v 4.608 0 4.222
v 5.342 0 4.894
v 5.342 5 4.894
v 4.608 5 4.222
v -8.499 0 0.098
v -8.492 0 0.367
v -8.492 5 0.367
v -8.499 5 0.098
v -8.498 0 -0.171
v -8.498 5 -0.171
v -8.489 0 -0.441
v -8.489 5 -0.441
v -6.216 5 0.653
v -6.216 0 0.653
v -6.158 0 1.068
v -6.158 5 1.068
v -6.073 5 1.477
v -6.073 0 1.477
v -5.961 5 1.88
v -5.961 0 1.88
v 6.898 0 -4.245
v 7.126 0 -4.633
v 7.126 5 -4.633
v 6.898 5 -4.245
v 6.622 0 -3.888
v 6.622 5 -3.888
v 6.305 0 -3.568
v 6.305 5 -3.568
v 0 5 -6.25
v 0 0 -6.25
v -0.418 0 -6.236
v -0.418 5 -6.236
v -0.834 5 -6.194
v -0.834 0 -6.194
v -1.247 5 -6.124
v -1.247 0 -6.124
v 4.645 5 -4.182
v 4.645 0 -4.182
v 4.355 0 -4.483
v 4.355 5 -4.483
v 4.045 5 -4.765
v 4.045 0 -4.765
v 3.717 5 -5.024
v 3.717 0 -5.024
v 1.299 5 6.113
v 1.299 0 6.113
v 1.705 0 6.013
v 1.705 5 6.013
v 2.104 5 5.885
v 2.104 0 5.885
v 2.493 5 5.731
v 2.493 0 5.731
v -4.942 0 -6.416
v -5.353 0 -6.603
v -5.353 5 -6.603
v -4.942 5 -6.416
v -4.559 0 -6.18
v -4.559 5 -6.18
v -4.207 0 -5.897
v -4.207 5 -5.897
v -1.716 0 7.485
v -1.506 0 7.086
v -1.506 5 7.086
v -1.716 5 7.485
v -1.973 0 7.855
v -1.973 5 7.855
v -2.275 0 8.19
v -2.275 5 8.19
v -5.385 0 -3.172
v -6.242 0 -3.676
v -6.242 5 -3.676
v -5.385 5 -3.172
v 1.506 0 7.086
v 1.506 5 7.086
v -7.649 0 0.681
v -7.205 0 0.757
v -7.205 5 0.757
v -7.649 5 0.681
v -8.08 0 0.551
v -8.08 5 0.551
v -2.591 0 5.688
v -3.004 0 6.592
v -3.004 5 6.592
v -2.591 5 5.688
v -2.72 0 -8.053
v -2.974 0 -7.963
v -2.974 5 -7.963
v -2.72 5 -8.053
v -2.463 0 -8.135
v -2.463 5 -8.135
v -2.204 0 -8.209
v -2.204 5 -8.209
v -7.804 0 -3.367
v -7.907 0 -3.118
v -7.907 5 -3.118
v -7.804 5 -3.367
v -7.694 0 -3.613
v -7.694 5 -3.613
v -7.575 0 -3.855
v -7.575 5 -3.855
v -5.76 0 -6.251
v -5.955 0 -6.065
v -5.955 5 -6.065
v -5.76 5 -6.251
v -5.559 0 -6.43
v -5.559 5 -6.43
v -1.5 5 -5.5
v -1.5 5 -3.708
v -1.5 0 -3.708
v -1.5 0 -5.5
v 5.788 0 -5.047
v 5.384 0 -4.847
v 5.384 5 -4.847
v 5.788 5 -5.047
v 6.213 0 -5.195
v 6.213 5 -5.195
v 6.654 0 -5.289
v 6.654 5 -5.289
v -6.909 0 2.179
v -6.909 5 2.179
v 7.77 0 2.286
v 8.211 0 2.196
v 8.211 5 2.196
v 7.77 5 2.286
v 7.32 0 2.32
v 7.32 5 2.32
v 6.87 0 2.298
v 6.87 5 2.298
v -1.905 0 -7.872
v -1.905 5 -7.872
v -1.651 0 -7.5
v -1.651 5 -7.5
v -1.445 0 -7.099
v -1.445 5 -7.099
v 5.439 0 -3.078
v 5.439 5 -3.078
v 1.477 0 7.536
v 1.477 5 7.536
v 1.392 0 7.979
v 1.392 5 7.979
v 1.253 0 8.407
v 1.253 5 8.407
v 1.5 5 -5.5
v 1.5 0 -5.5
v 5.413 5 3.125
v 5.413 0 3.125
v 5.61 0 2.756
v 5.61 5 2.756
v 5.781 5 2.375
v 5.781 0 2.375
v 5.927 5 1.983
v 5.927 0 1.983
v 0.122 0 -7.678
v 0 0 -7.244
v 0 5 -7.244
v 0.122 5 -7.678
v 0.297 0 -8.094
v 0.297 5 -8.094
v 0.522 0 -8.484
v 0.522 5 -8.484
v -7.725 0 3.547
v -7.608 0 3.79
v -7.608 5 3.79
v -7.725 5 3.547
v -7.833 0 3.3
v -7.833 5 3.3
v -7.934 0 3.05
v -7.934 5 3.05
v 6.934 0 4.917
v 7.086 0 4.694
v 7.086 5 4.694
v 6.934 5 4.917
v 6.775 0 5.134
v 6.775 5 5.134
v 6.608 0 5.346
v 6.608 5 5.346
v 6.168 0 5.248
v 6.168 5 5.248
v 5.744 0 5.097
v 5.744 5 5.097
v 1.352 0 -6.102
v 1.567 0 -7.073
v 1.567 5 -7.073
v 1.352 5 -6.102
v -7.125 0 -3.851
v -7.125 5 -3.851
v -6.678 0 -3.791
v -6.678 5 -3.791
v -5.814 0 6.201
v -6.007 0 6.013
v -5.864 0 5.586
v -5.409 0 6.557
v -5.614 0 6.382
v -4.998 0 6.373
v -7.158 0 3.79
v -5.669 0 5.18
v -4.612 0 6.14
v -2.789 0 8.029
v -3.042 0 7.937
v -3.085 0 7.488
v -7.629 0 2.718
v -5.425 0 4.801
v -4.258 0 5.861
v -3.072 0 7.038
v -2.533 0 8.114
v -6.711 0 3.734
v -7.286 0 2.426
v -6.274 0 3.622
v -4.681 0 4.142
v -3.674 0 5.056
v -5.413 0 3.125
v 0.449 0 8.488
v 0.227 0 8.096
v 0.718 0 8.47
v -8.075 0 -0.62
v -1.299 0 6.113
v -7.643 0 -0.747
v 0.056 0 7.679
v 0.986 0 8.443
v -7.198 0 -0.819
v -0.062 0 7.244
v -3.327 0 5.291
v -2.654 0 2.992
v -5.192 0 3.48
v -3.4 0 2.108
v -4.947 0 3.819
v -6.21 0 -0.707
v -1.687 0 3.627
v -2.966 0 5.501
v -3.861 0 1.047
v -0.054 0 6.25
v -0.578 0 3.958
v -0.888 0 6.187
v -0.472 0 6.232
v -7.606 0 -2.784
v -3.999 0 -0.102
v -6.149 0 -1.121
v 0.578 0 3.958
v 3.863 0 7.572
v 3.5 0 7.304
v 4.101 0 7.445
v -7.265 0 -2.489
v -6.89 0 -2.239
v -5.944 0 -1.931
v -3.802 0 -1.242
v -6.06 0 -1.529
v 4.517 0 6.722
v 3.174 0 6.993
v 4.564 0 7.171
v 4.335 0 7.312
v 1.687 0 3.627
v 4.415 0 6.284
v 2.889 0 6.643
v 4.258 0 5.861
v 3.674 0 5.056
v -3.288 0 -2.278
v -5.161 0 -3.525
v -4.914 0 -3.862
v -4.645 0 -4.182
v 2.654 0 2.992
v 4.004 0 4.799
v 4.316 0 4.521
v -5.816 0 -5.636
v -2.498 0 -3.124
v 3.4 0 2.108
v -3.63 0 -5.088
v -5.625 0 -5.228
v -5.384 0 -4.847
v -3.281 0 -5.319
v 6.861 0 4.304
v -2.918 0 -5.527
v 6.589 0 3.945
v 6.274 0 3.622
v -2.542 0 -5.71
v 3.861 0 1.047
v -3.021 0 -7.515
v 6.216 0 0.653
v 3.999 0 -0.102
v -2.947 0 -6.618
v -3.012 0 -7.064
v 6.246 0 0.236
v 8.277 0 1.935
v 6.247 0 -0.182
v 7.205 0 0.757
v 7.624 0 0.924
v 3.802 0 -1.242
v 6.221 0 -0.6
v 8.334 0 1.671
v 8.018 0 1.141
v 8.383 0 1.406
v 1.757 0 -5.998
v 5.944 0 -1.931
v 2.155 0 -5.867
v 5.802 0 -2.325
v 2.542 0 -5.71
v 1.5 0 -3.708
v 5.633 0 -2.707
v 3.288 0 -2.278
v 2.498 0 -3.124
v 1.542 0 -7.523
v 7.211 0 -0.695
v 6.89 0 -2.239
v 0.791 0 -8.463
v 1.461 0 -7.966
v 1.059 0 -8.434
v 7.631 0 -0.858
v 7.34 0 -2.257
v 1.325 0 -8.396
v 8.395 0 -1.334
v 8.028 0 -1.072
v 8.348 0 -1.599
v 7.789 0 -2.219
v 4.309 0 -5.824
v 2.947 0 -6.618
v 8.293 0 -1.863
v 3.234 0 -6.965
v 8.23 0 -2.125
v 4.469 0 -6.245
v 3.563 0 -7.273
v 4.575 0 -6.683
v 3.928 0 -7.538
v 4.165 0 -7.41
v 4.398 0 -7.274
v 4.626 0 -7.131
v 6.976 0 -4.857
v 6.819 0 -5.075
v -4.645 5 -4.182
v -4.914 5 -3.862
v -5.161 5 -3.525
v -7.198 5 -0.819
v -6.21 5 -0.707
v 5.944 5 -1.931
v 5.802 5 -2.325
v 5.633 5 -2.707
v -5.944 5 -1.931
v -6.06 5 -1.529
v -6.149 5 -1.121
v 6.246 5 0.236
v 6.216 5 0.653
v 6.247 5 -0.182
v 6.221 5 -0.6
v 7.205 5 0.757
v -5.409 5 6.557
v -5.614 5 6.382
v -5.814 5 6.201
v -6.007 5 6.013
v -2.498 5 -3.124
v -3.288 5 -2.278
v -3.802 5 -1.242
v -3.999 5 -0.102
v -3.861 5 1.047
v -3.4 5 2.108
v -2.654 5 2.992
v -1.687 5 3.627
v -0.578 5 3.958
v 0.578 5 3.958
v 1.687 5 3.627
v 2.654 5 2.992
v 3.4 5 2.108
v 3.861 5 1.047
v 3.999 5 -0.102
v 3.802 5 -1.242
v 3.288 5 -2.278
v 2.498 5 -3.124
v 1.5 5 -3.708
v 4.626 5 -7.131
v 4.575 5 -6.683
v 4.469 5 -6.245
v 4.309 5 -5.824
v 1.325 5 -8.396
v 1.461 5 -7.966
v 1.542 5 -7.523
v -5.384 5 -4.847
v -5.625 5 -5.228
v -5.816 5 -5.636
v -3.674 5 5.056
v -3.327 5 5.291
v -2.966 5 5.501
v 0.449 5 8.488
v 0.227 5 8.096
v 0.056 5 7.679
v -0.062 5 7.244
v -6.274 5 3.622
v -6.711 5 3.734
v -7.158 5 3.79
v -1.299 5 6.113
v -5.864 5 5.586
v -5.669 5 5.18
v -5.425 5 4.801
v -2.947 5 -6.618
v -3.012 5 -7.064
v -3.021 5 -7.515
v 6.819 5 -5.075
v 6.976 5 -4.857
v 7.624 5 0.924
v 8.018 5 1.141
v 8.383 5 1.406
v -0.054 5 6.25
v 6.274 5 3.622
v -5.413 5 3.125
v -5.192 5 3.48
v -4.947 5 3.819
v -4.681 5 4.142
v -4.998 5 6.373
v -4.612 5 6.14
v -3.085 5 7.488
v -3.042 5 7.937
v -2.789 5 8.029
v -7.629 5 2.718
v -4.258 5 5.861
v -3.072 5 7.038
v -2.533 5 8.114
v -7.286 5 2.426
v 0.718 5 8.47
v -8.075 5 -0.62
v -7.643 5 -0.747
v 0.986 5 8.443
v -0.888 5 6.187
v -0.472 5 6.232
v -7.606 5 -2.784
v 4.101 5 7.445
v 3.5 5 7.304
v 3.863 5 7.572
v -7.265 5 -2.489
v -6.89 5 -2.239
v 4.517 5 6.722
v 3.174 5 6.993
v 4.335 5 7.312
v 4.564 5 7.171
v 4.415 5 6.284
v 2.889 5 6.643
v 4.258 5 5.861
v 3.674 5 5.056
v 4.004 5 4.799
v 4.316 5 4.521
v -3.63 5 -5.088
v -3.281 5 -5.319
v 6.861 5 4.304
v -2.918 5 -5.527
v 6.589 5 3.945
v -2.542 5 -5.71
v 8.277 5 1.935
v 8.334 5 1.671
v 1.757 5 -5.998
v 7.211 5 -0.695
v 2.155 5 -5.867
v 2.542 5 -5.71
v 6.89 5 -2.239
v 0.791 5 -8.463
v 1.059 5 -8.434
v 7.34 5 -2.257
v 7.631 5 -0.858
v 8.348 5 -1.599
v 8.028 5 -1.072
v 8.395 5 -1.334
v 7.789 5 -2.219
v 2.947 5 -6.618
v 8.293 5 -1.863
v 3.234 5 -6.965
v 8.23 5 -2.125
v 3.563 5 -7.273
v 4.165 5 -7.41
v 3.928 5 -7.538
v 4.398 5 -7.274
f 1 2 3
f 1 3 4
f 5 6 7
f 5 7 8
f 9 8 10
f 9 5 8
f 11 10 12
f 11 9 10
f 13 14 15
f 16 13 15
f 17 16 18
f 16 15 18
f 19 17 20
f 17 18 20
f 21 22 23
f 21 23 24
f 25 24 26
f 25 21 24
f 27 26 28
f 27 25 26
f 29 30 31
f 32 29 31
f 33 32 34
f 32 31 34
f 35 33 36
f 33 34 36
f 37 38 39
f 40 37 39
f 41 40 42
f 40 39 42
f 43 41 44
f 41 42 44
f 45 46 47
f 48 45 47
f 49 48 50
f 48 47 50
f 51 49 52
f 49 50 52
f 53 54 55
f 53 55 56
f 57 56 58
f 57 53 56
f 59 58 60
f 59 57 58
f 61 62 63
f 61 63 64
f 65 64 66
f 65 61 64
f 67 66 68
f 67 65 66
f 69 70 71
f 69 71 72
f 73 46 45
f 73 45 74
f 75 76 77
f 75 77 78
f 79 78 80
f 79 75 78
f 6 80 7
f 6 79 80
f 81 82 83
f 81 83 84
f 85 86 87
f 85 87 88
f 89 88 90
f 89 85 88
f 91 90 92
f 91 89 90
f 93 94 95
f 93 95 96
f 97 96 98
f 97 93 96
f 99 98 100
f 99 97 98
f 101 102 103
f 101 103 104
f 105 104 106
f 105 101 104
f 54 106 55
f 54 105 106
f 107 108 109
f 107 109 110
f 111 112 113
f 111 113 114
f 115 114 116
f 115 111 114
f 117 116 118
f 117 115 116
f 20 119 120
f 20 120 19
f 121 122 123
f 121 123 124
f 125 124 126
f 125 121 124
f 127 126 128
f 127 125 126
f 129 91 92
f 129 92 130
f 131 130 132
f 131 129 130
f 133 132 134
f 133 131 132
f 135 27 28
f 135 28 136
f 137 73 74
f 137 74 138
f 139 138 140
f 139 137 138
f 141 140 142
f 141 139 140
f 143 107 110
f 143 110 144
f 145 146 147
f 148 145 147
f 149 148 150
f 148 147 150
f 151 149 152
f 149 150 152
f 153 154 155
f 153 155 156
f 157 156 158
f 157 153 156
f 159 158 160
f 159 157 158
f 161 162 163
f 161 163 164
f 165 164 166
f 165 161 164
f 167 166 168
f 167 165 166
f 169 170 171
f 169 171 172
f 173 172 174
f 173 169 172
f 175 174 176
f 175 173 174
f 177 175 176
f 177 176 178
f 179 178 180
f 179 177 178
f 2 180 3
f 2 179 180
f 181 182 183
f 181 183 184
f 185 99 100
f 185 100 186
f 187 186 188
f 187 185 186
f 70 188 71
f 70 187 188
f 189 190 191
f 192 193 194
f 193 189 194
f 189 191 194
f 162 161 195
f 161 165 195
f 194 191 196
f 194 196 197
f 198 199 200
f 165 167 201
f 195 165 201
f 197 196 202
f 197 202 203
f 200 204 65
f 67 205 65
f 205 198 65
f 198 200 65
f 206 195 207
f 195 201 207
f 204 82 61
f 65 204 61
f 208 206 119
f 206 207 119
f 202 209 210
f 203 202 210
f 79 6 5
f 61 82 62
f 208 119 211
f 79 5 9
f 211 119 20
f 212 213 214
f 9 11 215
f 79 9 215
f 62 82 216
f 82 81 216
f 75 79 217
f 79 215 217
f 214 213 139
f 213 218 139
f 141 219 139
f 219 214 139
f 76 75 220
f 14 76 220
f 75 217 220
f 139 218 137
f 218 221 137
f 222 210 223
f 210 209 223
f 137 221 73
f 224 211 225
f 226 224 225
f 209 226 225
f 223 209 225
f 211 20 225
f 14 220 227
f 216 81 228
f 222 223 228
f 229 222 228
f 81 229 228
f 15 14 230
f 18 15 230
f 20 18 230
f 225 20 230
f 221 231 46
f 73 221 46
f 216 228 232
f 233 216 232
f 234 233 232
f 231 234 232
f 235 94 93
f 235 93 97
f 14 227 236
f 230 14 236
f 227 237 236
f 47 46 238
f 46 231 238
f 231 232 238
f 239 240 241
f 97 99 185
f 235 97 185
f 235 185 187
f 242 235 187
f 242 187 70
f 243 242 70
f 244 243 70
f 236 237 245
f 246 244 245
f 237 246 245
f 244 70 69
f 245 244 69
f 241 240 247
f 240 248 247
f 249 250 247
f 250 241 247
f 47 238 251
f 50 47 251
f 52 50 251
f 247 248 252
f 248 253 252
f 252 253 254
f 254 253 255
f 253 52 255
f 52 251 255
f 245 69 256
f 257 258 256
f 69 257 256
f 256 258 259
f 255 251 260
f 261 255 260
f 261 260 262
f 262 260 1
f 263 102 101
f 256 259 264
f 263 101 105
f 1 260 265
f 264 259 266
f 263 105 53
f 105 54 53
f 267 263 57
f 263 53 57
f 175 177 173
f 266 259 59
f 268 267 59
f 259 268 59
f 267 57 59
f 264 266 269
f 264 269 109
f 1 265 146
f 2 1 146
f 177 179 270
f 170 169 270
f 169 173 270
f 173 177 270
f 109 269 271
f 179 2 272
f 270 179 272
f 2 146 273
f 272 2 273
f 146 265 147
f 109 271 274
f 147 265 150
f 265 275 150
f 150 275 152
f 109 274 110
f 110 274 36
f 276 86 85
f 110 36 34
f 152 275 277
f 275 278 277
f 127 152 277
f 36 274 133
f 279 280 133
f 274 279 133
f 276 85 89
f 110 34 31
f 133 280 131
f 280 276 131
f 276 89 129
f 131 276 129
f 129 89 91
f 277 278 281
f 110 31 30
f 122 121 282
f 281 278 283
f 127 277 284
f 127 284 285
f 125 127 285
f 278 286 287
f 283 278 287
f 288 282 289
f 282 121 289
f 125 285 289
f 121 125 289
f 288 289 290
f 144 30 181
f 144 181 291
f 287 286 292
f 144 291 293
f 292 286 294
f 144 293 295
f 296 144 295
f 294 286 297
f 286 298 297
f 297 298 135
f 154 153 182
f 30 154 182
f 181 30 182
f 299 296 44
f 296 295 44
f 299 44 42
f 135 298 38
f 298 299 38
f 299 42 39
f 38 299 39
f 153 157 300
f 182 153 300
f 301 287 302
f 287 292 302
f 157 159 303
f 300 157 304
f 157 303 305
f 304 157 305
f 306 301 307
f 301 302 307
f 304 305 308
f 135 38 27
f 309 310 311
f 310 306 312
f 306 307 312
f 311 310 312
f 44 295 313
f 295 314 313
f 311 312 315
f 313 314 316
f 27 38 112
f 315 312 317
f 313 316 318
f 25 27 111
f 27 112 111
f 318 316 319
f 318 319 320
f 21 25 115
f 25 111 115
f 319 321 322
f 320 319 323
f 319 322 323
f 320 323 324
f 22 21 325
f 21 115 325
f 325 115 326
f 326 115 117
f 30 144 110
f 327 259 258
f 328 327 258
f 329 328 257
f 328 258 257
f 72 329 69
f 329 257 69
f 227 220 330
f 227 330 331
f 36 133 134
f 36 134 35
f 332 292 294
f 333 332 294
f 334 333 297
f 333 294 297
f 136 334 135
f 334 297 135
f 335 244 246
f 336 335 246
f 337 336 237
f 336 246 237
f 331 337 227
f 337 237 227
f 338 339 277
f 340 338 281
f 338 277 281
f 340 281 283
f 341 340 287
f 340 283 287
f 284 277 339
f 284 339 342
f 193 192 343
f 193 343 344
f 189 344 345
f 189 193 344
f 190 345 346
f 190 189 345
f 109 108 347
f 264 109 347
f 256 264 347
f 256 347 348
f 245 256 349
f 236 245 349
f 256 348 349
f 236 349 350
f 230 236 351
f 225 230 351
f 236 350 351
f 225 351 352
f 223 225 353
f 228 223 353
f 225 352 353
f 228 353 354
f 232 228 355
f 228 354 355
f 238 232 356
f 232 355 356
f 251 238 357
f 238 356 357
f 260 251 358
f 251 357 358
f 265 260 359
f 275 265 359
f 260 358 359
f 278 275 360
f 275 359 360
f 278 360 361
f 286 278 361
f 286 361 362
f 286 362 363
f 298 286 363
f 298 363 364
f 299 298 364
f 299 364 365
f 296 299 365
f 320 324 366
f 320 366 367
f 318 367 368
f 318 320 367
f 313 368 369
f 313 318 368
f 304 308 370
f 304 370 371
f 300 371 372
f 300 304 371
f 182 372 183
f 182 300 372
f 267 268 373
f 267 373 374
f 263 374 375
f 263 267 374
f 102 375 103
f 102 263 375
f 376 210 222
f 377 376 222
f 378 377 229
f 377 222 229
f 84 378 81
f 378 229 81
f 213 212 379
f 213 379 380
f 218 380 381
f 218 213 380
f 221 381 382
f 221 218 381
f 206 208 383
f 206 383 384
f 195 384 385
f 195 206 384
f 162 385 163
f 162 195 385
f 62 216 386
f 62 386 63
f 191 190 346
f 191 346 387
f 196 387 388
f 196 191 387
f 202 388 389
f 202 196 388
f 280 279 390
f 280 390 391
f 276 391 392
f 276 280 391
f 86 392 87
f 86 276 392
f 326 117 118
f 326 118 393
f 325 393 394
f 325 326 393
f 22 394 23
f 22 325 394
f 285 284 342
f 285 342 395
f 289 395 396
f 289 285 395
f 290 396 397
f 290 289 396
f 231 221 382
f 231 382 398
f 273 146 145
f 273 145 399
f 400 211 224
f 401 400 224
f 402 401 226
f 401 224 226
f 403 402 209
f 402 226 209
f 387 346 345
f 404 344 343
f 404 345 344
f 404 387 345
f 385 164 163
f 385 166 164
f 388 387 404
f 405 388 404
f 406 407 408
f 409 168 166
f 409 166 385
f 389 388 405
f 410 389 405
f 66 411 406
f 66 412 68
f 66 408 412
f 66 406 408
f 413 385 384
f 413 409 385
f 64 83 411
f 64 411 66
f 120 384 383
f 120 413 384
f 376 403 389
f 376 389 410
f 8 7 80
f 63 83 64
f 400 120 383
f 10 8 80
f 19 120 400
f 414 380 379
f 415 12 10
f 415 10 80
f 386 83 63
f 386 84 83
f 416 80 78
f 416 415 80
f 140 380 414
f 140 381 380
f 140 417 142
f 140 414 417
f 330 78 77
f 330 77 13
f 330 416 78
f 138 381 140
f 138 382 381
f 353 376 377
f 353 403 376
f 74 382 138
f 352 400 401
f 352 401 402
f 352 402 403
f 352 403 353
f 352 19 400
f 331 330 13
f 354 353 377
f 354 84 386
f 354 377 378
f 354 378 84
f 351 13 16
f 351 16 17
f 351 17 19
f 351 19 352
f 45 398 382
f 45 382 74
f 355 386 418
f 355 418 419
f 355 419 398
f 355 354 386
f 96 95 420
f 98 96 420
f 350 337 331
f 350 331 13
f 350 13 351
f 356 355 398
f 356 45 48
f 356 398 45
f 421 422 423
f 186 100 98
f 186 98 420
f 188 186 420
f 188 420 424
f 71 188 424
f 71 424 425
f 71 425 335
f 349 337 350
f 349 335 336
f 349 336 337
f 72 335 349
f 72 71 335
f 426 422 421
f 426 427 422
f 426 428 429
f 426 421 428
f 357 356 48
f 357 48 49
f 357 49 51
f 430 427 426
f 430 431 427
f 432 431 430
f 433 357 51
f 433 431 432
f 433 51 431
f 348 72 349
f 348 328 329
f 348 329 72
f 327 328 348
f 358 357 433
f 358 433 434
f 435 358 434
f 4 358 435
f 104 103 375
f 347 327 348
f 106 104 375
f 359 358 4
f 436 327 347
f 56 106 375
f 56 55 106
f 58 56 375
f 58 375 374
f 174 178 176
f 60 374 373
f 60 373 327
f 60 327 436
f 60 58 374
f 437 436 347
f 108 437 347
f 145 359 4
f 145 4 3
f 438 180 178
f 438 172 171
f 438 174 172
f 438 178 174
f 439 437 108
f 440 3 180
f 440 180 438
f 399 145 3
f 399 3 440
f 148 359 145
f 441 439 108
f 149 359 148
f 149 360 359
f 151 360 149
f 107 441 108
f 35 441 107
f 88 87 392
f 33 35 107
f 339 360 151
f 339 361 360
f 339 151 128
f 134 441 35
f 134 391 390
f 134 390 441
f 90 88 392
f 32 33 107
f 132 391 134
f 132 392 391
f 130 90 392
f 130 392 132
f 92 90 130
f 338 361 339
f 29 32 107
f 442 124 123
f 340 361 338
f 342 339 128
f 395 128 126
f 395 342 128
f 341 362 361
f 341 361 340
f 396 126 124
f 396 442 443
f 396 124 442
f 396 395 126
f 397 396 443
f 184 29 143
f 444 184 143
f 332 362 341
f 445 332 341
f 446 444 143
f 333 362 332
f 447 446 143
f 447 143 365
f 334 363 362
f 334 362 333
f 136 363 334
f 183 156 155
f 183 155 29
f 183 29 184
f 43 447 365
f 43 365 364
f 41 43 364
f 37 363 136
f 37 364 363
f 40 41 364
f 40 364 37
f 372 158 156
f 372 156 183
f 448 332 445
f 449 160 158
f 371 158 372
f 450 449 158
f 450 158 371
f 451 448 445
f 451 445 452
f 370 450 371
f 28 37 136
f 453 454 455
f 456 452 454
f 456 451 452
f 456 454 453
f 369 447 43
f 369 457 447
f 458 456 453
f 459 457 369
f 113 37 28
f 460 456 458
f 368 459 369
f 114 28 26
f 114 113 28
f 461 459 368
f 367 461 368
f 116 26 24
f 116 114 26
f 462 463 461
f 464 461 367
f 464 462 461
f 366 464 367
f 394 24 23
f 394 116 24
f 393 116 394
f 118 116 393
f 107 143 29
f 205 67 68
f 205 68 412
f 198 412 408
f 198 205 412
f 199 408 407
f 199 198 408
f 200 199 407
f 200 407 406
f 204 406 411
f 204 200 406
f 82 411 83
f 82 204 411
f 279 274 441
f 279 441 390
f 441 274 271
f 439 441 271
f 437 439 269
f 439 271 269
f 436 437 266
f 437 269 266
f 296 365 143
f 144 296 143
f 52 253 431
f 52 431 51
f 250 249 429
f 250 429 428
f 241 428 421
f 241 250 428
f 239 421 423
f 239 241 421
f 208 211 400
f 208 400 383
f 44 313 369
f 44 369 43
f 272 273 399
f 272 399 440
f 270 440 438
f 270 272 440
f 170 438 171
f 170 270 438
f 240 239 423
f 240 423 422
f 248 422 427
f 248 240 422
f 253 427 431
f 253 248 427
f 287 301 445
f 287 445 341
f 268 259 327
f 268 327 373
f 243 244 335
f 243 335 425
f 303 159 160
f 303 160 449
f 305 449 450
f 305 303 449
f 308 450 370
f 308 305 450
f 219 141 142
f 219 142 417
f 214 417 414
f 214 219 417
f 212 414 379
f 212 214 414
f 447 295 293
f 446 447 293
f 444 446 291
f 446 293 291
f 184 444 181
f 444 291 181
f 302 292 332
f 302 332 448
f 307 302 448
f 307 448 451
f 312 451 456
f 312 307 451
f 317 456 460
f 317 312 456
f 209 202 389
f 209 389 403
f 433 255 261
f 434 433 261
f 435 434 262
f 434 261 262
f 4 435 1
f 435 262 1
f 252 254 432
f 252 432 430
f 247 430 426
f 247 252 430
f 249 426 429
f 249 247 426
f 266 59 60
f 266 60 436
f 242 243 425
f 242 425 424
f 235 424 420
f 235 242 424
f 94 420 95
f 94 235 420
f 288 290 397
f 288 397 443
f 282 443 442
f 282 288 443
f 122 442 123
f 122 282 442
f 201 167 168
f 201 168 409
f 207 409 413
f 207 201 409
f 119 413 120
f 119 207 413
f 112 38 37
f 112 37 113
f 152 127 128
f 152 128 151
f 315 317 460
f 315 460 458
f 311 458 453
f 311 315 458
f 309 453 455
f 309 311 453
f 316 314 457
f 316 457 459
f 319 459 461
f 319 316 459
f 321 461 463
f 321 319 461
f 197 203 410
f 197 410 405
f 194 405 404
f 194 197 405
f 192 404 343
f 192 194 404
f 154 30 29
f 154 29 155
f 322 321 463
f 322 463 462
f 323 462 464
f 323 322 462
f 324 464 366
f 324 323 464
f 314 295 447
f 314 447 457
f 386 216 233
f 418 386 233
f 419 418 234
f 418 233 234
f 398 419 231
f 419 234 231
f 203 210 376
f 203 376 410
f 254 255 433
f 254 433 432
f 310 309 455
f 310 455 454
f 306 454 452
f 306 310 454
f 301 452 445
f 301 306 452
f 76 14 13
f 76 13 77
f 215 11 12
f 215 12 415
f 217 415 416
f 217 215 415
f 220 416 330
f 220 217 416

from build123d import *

# Parameters (mm, degrees)
BOSS_EXTRUDE1_DEPTH = 5
CIRPATTERN4_COUNT   = 15
SKETCH6_R           = 6.25
BOSS_EXTRUDE2_DEPTH = 5
SKETCH7_R           = 4
SKETCH7_W           = 3
SKETCH7_H           = 3
CUT_EXTRUDE1_DEPTH  = 14.011467857


with BuildPart() as part:
    # Sketch3 → Boss-Extrude1 (new body)
    with BuildSketch(Plane(origin=(0, 0, 0), x_dir=(1, 0, 0), z_dir=(0, 1, 0))):
        with BuildLine():
            Line((1.567279433, 7.07287775), (1.352139221, 6.101984884))
            ThreePointArc((1.352139221, 6.101984884), (0.680108254, 6.212886025), (0, 6.25))
            Line((0, 6.25), (0, 7.244443697))
            ThreePointArc((0, 7.244443697), (0.202974195, 7.888710473), (0.522323902, 8.483936453))
            ThreePointArc((0.522323902, 8.483936453), (0.924947225, 8.449524994), (1.325480107, 8.396017061))
            ThreePointArc((1.325480107, 8.396017061), (1.508494299, 7.745798629), (1.567279433, 7.07287775))
        make_face()
    extrude(amount=BOSS_EXTRUDE1_DEPTH)


with BuildPart() as cirpattern4_1:
    # CirPattern4: pattern copy
    add(part.part.rotate(Axis((0, 0, 0), (0, 1, 0)), 1 * 360 / CIRPATTERN4_COUNT))


with BuildPart() as cirpattern4_2:
    # CirPattern4: pattern copy
    add(part.part.rotate(Axis((0, 0, 0), (0, 1, 0)), 2 * 360 / CIRPATTERN4_COUNT))


with BuildPart() as cirpattern4_3:
    # CirPattern4: pattern copy
    add(part.part.rotate(Axis((0, 0, 0), (0, 1, 0)), 3 * 360 / CIRPATTERN4_COUNT))


with BuildPart() as cirpattern4_4:
    # CirPattern4: pattern copy
    add(part.part.rotate(Axis((0, 0, 0), (0, 1, 0)), 4 * 360 / CIRPATTERN4_COUNT))


with BuildPart() as cirpattern4_5:
    # CirPattern4: pattern copy
    add(part.part.rotate(Axis((0, 0, 0), (0, 1, 0)), 5 * 360 / CIRPATTERN4_COUNT))


with BuildPart() as cirpattern4_6:
    # CirPattern4: pattern copy
    add(part.part.rotate(Axis((0, 0, 0), (0, 1, 0)), 6 * 360 / CIRPATTERN4_COUNT))


with BuildPart() as cirpattern4_7:
    # CirPattern4: pattern copy
    add(part.part.rotate(Axis((0, 0, 0), (0, 1, 0)), 7 * 360 / CIRPATTERN4_COUNT))


with BuildPart() as cirpattern4_8:
    # CirPattern4: pattern copy
    add(part.part.rotate(Axis((0, 0, 0), (0, 1, 0)), 8 * 360 / CIRPATTERN4_COUNT))


with BuildPart() as cirpattern4_9:
    # CirPattern4: pattern copy
    add(part.part.rotate(Axis((0, 0, 0), (0, 1, 0)), 9 * 360 / CIRPATTERN4_COUNT))


with BuildPart() as cirpattern4_10:
    # CirPattern4: pattern copy
    add(part.part.rotate(Axis((0, 0, 0), (0, 1, 0)), 10 * 360 / CIRPATTERN4_COUNT))


with BuildPart() as cirpattern4_11:
    # CirPattern4: pattern copy
    add(part.part.rotate(Axis((0, 0, 0), (0, 1, 0)), 11 * 360 / CIRPATTERN4_COUNT))


with BuildPart() as cirpattern4_12:
    # CirPattern4: pattern copy
    add(part.part.rotate(Axis((0, 0, 0), (0, 1, 0)), 12 * 360 / CIRPATTERN4_COUNT))


with BuildPart() as cirpattern4_13:
    # CirPattern4: pattern copy
    add(part.part.rotate(Axis((0, 0, 0), (0, 1, 0)), 13 * 360 / CIRPATTERN4_COUNT))


with BuildPart() as cirpattern4_14:
    # CirPattern4: pattern copy
    add(part.part.rotate(Axis((0, 0, 0), (0, 1, 0)), 14 * 360 / CIRPATTERN4_COUNT))


with BuildPart() as part_1:
    add(part.part)

    add(cirpattern4_1.part)  # Boss-Extrude2 merges CirPattern4_1

    add(cirpattern4_2.part)  # Boss-Extrude2 merges CirPattern4_2

    add(cirpattern4_3.part)  # Boss-Extrude2 merges CirPattern4_3

    add(cirpattern4_4.part)  # Boss-Extrude2 merges CirPattern4_4

    add(cirpattern4_5.part)  # Boss-Extrude2 merges CirPattern4_5

    add(cirpattern4_6.part)  # Boss-Extrude2 merges CirPattern4_6

    add(cirpattern4_7.part)  # Boss-Extrude2 merges CirPattern4_7

    add(cirpattern4_8.part)  # Boss-Extrude2 merges CirPattern4_8

    add(cirpattern4_9.part)  # Boss-Extrude2 merges CirPattern4_9

    add(cirpattern4_10.part)  # Boss-Extrude2 merges CirPattern4_10

    add(cirpattern4_11.part)  # Boss-Extrude2 merges CirPattern4_11

    add(cirpattern4_12.part)  # Boss-Extrude2 merges CirPattern4_12

    add(cirpattern4_13.part)  # Boss-Extrude2 merges CirPattern4_13

    add(cirpattern4_14.part)  # Boss-Extrude2 merges CirPattern4_14
    # Sketch6 → Boss-Extrude2 (add)
    with BuildSketch(Plane(origin=(0, 0, 0), x_dir=(1, 0, 0), z_dir=(0, 1, 0))):
        Circle(SKETCH6_R)
    extrude(amount=BOSS_EXTRUDE2_DEPTH)

    # Sketch7 → Cut-Extrude1 (cut, through all)
    with BuildSketch(Plane(origin=(0, 5, 0), x_dir=(1, 0, 0), z_dir=(0, 1, 0))):
        Circle(SKETCH7_R)
        with Locations((0, 4)):
            Rectangle(SKETCH7_W, SKETCH7_H)
    extrude(amount=-CUT_EXTRUDE1_DEPTH, mode=Mode.SUBTRACT)


solid = part_1.part
